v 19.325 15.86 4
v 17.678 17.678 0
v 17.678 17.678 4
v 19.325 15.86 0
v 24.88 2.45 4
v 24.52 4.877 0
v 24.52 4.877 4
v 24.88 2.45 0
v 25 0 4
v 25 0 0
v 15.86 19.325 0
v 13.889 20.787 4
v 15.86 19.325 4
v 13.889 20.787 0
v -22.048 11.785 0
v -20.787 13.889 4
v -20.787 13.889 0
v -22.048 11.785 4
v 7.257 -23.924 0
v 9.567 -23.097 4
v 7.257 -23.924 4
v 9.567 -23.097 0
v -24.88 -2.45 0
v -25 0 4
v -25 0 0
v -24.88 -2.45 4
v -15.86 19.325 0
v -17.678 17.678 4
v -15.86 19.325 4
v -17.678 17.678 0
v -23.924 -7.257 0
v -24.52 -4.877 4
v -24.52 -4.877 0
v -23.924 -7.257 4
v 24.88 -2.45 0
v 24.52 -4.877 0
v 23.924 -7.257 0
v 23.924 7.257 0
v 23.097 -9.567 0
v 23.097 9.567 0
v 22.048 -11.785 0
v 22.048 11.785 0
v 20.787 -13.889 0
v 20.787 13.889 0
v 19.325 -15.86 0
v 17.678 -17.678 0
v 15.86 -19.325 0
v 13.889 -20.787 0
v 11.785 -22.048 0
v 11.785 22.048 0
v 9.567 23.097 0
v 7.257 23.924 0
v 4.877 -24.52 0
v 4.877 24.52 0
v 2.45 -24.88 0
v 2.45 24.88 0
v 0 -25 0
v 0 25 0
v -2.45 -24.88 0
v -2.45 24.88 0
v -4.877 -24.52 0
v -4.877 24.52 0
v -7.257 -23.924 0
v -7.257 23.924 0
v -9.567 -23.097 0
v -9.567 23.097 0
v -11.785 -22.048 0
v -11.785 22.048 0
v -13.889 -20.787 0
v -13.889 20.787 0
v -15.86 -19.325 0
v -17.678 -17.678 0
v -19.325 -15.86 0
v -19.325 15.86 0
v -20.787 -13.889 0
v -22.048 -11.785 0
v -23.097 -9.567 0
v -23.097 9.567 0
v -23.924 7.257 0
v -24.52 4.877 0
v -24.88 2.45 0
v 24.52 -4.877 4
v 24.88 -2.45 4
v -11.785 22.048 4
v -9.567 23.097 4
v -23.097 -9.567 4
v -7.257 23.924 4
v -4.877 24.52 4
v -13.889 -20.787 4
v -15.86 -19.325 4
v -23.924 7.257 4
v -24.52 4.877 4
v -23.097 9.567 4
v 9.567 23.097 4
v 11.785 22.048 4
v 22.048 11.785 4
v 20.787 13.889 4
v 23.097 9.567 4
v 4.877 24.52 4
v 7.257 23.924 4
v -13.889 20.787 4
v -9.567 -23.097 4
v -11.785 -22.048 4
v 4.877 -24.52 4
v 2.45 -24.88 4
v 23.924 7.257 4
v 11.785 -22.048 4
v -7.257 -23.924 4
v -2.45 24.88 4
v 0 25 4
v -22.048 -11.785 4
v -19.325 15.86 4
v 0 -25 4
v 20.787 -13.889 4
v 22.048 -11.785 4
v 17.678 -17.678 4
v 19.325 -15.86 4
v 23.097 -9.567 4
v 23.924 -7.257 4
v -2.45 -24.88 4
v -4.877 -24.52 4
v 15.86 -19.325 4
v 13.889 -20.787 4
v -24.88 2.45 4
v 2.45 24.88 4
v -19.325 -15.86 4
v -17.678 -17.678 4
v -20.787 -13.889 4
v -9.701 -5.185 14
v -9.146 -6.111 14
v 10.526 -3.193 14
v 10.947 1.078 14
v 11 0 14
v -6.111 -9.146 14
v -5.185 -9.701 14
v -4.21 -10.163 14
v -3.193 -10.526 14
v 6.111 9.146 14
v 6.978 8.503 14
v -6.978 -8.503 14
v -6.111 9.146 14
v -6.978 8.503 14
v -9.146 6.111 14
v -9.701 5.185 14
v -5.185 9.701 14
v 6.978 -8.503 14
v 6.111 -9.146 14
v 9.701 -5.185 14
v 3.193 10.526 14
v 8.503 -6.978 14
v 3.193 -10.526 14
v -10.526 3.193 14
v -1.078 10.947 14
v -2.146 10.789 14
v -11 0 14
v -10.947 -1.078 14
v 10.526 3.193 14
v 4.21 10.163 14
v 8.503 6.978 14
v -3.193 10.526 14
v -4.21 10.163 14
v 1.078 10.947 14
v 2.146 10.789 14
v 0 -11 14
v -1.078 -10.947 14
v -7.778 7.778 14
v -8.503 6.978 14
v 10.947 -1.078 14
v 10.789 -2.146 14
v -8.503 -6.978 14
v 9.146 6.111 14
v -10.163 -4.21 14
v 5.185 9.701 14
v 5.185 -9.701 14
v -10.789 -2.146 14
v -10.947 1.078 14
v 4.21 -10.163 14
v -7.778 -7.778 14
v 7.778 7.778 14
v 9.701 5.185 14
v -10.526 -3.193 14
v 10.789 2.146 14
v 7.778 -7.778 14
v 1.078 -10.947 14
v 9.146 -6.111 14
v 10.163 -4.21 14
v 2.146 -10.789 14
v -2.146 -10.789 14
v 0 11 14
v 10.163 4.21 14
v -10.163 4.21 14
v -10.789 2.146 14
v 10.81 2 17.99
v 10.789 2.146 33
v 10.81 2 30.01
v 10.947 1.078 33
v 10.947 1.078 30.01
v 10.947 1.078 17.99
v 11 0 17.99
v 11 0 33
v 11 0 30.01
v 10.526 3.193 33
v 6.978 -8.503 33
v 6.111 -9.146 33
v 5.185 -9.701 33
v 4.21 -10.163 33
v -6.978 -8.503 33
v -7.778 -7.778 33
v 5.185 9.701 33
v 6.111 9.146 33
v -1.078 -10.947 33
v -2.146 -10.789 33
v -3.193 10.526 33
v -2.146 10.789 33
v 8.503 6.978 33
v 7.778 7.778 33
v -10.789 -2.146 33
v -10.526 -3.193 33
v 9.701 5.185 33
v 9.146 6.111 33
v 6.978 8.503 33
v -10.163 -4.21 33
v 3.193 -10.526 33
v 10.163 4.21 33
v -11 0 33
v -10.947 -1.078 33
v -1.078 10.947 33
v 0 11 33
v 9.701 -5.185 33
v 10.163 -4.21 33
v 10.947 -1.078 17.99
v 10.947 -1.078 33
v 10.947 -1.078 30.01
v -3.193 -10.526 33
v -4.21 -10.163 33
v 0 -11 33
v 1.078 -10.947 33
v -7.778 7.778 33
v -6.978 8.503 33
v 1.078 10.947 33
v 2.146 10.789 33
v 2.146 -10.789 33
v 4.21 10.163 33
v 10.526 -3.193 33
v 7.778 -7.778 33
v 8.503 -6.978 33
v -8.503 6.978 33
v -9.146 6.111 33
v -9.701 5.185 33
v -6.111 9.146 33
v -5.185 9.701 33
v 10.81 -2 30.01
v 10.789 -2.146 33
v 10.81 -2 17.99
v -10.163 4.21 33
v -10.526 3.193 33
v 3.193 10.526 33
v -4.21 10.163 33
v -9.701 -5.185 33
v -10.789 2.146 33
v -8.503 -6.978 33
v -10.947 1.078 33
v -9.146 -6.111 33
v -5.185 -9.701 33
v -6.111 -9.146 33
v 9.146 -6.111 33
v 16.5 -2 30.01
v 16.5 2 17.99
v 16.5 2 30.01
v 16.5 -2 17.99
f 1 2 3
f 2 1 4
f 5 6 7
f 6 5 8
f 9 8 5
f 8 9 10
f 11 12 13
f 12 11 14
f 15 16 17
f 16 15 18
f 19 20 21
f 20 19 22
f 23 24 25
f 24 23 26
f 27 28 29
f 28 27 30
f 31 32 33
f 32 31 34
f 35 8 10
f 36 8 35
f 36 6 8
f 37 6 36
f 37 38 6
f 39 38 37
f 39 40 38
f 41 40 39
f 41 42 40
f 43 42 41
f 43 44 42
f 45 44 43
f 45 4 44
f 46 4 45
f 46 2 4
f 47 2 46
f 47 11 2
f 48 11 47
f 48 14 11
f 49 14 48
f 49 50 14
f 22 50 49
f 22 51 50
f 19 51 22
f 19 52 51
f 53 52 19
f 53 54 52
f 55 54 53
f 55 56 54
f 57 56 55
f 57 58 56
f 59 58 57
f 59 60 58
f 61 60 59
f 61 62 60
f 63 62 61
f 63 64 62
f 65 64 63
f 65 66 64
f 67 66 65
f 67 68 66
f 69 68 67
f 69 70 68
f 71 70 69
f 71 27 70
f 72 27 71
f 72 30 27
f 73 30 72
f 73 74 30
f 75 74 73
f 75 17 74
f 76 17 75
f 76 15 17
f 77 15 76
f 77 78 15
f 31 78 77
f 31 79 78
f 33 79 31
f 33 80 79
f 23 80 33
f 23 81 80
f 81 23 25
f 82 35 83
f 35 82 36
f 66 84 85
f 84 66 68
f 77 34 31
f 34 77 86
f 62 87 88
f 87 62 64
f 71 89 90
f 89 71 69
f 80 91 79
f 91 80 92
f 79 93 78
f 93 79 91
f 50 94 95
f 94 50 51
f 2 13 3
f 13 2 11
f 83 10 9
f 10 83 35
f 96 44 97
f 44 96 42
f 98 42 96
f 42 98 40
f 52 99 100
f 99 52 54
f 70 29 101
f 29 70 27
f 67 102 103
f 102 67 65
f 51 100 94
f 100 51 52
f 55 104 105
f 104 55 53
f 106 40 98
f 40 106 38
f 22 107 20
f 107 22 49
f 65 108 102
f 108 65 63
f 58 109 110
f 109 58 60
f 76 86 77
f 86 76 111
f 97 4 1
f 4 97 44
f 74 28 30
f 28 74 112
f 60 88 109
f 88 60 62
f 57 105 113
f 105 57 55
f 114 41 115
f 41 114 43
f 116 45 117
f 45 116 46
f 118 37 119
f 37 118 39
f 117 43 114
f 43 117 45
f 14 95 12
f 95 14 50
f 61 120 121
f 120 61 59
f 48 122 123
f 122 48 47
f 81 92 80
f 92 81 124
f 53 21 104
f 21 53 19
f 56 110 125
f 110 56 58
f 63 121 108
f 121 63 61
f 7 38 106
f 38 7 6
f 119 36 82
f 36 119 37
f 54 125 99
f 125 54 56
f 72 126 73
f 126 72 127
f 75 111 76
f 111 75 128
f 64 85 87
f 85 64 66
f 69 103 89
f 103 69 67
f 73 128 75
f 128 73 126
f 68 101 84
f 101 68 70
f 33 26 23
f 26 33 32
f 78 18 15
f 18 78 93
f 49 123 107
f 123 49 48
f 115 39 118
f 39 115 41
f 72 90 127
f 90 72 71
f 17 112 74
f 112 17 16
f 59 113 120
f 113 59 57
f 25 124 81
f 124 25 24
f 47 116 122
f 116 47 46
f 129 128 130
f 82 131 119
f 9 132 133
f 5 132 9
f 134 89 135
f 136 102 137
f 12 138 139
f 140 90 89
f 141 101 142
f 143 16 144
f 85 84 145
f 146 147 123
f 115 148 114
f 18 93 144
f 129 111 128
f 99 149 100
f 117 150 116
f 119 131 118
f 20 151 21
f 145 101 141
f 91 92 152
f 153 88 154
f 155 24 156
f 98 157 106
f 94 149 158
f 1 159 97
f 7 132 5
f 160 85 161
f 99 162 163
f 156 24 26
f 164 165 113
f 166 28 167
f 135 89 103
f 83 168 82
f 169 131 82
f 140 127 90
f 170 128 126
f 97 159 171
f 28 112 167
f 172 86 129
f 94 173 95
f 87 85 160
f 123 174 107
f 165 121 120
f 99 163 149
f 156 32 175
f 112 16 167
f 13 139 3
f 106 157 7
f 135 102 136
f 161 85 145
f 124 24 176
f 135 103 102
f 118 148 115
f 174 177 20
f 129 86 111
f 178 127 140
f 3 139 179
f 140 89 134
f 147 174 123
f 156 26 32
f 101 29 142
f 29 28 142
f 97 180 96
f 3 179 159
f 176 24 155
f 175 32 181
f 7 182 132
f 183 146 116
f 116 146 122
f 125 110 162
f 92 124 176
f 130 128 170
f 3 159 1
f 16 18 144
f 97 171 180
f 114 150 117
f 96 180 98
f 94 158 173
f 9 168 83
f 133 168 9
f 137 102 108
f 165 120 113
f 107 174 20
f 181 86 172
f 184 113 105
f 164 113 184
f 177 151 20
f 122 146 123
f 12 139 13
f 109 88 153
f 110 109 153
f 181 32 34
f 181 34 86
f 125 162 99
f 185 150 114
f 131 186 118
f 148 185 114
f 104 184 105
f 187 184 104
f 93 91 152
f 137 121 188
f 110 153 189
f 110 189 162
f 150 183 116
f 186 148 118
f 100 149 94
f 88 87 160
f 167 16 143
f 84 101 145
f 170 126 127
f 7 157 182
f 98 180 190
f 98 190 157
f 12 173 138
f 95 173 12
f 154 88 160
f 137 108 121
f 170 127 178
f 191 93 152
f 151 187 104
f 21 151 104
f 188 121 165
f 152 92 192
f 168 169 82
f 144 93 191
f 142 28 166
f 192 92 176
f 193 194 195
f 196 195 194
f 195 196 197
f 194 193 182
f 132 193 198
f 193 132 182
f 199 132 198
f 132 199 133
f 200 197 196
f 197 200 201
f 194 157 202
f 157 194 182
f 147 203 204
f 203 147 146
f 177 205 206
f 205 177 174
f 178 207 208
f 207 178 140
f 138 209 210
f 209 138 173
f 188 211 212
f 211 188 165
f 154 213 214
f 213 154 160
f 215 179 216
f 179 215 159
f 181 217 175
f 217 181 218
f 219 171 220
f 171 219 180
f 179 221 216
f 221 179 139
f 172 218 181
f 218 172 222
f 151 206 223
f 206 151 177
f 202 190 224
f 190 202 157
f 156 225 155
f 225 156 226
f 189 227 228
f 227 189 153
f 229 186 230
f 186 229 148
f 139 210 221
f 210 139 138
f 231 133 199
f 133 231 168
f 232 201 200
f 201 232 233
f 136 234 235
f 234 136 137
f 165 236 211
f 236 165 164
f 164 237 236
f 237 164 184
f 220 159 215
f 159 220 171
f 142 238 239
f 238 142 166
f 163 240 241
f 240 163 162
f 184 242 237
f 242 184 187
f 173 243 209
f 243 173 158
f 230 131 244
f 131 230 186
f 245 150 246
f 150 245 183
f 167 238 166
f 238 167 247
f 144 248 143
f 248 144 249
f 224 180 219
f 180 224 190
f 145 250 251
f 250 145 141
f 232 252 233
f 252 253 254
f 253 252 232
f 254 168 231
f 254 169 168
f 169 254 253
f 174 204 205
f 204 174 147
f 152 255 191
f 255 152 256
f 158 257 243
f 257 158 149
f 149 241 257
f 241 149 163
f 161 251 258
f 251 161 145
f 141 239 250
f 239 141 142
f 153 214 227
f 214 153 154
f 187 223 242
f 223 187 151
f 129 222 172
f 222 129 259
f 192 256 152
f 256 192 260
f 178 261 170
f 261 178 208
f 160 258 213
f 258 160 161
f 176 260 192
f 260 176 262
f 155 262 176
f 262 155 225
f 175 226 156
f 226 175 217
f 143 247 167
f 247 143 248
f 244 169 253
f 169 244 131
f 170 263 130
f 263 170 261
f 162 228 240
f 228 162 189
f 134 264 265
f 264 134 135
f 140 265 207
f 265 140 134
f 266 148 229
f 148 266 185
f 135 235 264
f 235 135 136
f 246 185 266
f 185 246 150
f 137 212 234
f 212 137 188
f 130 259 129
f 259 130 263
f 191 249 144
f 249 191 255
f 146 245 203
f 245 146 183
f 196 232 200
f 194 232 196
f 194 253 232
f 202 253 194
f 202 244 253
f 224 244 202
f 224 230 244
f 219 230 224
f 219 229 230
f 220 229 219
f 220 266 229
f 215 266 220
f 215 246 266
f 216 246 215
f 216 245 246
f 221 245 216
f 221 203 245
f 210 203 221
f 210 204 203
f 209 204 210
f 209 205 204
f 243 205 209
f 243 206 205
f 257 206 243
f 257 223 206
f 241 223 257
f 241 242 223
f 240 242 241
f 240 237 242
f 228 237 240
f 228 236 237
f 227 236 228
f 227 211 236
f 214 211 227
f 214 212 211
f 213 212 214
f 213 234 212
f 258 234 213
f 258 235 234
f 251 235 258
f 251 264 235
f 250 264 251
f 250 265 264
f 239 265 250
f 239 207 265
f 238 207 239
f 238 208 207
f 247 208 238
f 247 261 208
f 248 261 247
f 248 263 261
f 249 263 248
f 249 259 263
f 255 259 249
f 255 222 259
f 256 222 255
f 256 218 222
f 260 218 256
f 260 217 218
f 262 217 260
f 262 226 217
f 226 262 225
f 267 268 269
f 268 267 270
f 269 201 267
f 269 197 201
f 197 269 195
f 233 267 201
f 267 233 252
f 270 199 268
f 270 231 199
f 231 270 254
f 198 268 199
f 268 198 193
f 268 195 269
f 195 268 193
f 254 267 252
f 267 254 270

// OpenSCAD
// Dimensions (mm) - measured with calipers
base_dia = 50;
base_h = 4;
cone_top_dia = 50;
cone_bot_dia = 22;
cone_h = 10; // z=4 to z=14
col_dia = 22;
col_h = 19; // z=14 to z=33
seat_dia = 11;
seat_h = 10; // z=33 down to z=23
tip_dia = 3;
tip_z = 6;
window_w = 4;
window_z1 = 18;
window_z2 = 30;

$fn = 64;

// Base disc
translate([0, 0, 0])
  cylinder(h = base_h, r = base_dia / 2, center = false);

// Cone from z=4 to z=14
translate([0, 0, base_h])
  cylinder(h = cone_h, r1 = cone_top_dia / 2, r2 = cone_bot_dia / 2, center = false);

// Column from z=14 to z=33
translate([0, 0, base_h + cone_h])
  cylinder(h = col_h, r = col_dia / 2, center = false);

// Tube seat (cylindrical part) from z=23 to z=33
translate([0, 0, tip_z + seat_h])
  cylinder(h = seat_h, r = seat_dia / 2, center = false);

// Tube seat (conical part) from z=6 to z=23
// This cone narrows from seat_dia at z=23 to tip_dia at z=6
cone_seat_h = 23 - tip_z;
translate([0, 0, tip_z])
  cylinder(h = cone_seat_h, r1 = tip_dia / 2, r2 = seat_dia / 2, center = false);

// Viewing window cutout on +X side
// The window is 4mm wide in Y, from z=18 to z=30
// It cuts through the column wall on the +X side
// Column radius is col_dia/2 = 11mm
// Window extends from the seat (r=5.5mm) to outside (r=11mm)
translate([col_dia / 2 - 0.5, 0, (window_z1 + window_z2) / 2])
  cube([col_dia / 2 + 1, window_w, window_z2 - window_z1 + 0.02], center = true);
